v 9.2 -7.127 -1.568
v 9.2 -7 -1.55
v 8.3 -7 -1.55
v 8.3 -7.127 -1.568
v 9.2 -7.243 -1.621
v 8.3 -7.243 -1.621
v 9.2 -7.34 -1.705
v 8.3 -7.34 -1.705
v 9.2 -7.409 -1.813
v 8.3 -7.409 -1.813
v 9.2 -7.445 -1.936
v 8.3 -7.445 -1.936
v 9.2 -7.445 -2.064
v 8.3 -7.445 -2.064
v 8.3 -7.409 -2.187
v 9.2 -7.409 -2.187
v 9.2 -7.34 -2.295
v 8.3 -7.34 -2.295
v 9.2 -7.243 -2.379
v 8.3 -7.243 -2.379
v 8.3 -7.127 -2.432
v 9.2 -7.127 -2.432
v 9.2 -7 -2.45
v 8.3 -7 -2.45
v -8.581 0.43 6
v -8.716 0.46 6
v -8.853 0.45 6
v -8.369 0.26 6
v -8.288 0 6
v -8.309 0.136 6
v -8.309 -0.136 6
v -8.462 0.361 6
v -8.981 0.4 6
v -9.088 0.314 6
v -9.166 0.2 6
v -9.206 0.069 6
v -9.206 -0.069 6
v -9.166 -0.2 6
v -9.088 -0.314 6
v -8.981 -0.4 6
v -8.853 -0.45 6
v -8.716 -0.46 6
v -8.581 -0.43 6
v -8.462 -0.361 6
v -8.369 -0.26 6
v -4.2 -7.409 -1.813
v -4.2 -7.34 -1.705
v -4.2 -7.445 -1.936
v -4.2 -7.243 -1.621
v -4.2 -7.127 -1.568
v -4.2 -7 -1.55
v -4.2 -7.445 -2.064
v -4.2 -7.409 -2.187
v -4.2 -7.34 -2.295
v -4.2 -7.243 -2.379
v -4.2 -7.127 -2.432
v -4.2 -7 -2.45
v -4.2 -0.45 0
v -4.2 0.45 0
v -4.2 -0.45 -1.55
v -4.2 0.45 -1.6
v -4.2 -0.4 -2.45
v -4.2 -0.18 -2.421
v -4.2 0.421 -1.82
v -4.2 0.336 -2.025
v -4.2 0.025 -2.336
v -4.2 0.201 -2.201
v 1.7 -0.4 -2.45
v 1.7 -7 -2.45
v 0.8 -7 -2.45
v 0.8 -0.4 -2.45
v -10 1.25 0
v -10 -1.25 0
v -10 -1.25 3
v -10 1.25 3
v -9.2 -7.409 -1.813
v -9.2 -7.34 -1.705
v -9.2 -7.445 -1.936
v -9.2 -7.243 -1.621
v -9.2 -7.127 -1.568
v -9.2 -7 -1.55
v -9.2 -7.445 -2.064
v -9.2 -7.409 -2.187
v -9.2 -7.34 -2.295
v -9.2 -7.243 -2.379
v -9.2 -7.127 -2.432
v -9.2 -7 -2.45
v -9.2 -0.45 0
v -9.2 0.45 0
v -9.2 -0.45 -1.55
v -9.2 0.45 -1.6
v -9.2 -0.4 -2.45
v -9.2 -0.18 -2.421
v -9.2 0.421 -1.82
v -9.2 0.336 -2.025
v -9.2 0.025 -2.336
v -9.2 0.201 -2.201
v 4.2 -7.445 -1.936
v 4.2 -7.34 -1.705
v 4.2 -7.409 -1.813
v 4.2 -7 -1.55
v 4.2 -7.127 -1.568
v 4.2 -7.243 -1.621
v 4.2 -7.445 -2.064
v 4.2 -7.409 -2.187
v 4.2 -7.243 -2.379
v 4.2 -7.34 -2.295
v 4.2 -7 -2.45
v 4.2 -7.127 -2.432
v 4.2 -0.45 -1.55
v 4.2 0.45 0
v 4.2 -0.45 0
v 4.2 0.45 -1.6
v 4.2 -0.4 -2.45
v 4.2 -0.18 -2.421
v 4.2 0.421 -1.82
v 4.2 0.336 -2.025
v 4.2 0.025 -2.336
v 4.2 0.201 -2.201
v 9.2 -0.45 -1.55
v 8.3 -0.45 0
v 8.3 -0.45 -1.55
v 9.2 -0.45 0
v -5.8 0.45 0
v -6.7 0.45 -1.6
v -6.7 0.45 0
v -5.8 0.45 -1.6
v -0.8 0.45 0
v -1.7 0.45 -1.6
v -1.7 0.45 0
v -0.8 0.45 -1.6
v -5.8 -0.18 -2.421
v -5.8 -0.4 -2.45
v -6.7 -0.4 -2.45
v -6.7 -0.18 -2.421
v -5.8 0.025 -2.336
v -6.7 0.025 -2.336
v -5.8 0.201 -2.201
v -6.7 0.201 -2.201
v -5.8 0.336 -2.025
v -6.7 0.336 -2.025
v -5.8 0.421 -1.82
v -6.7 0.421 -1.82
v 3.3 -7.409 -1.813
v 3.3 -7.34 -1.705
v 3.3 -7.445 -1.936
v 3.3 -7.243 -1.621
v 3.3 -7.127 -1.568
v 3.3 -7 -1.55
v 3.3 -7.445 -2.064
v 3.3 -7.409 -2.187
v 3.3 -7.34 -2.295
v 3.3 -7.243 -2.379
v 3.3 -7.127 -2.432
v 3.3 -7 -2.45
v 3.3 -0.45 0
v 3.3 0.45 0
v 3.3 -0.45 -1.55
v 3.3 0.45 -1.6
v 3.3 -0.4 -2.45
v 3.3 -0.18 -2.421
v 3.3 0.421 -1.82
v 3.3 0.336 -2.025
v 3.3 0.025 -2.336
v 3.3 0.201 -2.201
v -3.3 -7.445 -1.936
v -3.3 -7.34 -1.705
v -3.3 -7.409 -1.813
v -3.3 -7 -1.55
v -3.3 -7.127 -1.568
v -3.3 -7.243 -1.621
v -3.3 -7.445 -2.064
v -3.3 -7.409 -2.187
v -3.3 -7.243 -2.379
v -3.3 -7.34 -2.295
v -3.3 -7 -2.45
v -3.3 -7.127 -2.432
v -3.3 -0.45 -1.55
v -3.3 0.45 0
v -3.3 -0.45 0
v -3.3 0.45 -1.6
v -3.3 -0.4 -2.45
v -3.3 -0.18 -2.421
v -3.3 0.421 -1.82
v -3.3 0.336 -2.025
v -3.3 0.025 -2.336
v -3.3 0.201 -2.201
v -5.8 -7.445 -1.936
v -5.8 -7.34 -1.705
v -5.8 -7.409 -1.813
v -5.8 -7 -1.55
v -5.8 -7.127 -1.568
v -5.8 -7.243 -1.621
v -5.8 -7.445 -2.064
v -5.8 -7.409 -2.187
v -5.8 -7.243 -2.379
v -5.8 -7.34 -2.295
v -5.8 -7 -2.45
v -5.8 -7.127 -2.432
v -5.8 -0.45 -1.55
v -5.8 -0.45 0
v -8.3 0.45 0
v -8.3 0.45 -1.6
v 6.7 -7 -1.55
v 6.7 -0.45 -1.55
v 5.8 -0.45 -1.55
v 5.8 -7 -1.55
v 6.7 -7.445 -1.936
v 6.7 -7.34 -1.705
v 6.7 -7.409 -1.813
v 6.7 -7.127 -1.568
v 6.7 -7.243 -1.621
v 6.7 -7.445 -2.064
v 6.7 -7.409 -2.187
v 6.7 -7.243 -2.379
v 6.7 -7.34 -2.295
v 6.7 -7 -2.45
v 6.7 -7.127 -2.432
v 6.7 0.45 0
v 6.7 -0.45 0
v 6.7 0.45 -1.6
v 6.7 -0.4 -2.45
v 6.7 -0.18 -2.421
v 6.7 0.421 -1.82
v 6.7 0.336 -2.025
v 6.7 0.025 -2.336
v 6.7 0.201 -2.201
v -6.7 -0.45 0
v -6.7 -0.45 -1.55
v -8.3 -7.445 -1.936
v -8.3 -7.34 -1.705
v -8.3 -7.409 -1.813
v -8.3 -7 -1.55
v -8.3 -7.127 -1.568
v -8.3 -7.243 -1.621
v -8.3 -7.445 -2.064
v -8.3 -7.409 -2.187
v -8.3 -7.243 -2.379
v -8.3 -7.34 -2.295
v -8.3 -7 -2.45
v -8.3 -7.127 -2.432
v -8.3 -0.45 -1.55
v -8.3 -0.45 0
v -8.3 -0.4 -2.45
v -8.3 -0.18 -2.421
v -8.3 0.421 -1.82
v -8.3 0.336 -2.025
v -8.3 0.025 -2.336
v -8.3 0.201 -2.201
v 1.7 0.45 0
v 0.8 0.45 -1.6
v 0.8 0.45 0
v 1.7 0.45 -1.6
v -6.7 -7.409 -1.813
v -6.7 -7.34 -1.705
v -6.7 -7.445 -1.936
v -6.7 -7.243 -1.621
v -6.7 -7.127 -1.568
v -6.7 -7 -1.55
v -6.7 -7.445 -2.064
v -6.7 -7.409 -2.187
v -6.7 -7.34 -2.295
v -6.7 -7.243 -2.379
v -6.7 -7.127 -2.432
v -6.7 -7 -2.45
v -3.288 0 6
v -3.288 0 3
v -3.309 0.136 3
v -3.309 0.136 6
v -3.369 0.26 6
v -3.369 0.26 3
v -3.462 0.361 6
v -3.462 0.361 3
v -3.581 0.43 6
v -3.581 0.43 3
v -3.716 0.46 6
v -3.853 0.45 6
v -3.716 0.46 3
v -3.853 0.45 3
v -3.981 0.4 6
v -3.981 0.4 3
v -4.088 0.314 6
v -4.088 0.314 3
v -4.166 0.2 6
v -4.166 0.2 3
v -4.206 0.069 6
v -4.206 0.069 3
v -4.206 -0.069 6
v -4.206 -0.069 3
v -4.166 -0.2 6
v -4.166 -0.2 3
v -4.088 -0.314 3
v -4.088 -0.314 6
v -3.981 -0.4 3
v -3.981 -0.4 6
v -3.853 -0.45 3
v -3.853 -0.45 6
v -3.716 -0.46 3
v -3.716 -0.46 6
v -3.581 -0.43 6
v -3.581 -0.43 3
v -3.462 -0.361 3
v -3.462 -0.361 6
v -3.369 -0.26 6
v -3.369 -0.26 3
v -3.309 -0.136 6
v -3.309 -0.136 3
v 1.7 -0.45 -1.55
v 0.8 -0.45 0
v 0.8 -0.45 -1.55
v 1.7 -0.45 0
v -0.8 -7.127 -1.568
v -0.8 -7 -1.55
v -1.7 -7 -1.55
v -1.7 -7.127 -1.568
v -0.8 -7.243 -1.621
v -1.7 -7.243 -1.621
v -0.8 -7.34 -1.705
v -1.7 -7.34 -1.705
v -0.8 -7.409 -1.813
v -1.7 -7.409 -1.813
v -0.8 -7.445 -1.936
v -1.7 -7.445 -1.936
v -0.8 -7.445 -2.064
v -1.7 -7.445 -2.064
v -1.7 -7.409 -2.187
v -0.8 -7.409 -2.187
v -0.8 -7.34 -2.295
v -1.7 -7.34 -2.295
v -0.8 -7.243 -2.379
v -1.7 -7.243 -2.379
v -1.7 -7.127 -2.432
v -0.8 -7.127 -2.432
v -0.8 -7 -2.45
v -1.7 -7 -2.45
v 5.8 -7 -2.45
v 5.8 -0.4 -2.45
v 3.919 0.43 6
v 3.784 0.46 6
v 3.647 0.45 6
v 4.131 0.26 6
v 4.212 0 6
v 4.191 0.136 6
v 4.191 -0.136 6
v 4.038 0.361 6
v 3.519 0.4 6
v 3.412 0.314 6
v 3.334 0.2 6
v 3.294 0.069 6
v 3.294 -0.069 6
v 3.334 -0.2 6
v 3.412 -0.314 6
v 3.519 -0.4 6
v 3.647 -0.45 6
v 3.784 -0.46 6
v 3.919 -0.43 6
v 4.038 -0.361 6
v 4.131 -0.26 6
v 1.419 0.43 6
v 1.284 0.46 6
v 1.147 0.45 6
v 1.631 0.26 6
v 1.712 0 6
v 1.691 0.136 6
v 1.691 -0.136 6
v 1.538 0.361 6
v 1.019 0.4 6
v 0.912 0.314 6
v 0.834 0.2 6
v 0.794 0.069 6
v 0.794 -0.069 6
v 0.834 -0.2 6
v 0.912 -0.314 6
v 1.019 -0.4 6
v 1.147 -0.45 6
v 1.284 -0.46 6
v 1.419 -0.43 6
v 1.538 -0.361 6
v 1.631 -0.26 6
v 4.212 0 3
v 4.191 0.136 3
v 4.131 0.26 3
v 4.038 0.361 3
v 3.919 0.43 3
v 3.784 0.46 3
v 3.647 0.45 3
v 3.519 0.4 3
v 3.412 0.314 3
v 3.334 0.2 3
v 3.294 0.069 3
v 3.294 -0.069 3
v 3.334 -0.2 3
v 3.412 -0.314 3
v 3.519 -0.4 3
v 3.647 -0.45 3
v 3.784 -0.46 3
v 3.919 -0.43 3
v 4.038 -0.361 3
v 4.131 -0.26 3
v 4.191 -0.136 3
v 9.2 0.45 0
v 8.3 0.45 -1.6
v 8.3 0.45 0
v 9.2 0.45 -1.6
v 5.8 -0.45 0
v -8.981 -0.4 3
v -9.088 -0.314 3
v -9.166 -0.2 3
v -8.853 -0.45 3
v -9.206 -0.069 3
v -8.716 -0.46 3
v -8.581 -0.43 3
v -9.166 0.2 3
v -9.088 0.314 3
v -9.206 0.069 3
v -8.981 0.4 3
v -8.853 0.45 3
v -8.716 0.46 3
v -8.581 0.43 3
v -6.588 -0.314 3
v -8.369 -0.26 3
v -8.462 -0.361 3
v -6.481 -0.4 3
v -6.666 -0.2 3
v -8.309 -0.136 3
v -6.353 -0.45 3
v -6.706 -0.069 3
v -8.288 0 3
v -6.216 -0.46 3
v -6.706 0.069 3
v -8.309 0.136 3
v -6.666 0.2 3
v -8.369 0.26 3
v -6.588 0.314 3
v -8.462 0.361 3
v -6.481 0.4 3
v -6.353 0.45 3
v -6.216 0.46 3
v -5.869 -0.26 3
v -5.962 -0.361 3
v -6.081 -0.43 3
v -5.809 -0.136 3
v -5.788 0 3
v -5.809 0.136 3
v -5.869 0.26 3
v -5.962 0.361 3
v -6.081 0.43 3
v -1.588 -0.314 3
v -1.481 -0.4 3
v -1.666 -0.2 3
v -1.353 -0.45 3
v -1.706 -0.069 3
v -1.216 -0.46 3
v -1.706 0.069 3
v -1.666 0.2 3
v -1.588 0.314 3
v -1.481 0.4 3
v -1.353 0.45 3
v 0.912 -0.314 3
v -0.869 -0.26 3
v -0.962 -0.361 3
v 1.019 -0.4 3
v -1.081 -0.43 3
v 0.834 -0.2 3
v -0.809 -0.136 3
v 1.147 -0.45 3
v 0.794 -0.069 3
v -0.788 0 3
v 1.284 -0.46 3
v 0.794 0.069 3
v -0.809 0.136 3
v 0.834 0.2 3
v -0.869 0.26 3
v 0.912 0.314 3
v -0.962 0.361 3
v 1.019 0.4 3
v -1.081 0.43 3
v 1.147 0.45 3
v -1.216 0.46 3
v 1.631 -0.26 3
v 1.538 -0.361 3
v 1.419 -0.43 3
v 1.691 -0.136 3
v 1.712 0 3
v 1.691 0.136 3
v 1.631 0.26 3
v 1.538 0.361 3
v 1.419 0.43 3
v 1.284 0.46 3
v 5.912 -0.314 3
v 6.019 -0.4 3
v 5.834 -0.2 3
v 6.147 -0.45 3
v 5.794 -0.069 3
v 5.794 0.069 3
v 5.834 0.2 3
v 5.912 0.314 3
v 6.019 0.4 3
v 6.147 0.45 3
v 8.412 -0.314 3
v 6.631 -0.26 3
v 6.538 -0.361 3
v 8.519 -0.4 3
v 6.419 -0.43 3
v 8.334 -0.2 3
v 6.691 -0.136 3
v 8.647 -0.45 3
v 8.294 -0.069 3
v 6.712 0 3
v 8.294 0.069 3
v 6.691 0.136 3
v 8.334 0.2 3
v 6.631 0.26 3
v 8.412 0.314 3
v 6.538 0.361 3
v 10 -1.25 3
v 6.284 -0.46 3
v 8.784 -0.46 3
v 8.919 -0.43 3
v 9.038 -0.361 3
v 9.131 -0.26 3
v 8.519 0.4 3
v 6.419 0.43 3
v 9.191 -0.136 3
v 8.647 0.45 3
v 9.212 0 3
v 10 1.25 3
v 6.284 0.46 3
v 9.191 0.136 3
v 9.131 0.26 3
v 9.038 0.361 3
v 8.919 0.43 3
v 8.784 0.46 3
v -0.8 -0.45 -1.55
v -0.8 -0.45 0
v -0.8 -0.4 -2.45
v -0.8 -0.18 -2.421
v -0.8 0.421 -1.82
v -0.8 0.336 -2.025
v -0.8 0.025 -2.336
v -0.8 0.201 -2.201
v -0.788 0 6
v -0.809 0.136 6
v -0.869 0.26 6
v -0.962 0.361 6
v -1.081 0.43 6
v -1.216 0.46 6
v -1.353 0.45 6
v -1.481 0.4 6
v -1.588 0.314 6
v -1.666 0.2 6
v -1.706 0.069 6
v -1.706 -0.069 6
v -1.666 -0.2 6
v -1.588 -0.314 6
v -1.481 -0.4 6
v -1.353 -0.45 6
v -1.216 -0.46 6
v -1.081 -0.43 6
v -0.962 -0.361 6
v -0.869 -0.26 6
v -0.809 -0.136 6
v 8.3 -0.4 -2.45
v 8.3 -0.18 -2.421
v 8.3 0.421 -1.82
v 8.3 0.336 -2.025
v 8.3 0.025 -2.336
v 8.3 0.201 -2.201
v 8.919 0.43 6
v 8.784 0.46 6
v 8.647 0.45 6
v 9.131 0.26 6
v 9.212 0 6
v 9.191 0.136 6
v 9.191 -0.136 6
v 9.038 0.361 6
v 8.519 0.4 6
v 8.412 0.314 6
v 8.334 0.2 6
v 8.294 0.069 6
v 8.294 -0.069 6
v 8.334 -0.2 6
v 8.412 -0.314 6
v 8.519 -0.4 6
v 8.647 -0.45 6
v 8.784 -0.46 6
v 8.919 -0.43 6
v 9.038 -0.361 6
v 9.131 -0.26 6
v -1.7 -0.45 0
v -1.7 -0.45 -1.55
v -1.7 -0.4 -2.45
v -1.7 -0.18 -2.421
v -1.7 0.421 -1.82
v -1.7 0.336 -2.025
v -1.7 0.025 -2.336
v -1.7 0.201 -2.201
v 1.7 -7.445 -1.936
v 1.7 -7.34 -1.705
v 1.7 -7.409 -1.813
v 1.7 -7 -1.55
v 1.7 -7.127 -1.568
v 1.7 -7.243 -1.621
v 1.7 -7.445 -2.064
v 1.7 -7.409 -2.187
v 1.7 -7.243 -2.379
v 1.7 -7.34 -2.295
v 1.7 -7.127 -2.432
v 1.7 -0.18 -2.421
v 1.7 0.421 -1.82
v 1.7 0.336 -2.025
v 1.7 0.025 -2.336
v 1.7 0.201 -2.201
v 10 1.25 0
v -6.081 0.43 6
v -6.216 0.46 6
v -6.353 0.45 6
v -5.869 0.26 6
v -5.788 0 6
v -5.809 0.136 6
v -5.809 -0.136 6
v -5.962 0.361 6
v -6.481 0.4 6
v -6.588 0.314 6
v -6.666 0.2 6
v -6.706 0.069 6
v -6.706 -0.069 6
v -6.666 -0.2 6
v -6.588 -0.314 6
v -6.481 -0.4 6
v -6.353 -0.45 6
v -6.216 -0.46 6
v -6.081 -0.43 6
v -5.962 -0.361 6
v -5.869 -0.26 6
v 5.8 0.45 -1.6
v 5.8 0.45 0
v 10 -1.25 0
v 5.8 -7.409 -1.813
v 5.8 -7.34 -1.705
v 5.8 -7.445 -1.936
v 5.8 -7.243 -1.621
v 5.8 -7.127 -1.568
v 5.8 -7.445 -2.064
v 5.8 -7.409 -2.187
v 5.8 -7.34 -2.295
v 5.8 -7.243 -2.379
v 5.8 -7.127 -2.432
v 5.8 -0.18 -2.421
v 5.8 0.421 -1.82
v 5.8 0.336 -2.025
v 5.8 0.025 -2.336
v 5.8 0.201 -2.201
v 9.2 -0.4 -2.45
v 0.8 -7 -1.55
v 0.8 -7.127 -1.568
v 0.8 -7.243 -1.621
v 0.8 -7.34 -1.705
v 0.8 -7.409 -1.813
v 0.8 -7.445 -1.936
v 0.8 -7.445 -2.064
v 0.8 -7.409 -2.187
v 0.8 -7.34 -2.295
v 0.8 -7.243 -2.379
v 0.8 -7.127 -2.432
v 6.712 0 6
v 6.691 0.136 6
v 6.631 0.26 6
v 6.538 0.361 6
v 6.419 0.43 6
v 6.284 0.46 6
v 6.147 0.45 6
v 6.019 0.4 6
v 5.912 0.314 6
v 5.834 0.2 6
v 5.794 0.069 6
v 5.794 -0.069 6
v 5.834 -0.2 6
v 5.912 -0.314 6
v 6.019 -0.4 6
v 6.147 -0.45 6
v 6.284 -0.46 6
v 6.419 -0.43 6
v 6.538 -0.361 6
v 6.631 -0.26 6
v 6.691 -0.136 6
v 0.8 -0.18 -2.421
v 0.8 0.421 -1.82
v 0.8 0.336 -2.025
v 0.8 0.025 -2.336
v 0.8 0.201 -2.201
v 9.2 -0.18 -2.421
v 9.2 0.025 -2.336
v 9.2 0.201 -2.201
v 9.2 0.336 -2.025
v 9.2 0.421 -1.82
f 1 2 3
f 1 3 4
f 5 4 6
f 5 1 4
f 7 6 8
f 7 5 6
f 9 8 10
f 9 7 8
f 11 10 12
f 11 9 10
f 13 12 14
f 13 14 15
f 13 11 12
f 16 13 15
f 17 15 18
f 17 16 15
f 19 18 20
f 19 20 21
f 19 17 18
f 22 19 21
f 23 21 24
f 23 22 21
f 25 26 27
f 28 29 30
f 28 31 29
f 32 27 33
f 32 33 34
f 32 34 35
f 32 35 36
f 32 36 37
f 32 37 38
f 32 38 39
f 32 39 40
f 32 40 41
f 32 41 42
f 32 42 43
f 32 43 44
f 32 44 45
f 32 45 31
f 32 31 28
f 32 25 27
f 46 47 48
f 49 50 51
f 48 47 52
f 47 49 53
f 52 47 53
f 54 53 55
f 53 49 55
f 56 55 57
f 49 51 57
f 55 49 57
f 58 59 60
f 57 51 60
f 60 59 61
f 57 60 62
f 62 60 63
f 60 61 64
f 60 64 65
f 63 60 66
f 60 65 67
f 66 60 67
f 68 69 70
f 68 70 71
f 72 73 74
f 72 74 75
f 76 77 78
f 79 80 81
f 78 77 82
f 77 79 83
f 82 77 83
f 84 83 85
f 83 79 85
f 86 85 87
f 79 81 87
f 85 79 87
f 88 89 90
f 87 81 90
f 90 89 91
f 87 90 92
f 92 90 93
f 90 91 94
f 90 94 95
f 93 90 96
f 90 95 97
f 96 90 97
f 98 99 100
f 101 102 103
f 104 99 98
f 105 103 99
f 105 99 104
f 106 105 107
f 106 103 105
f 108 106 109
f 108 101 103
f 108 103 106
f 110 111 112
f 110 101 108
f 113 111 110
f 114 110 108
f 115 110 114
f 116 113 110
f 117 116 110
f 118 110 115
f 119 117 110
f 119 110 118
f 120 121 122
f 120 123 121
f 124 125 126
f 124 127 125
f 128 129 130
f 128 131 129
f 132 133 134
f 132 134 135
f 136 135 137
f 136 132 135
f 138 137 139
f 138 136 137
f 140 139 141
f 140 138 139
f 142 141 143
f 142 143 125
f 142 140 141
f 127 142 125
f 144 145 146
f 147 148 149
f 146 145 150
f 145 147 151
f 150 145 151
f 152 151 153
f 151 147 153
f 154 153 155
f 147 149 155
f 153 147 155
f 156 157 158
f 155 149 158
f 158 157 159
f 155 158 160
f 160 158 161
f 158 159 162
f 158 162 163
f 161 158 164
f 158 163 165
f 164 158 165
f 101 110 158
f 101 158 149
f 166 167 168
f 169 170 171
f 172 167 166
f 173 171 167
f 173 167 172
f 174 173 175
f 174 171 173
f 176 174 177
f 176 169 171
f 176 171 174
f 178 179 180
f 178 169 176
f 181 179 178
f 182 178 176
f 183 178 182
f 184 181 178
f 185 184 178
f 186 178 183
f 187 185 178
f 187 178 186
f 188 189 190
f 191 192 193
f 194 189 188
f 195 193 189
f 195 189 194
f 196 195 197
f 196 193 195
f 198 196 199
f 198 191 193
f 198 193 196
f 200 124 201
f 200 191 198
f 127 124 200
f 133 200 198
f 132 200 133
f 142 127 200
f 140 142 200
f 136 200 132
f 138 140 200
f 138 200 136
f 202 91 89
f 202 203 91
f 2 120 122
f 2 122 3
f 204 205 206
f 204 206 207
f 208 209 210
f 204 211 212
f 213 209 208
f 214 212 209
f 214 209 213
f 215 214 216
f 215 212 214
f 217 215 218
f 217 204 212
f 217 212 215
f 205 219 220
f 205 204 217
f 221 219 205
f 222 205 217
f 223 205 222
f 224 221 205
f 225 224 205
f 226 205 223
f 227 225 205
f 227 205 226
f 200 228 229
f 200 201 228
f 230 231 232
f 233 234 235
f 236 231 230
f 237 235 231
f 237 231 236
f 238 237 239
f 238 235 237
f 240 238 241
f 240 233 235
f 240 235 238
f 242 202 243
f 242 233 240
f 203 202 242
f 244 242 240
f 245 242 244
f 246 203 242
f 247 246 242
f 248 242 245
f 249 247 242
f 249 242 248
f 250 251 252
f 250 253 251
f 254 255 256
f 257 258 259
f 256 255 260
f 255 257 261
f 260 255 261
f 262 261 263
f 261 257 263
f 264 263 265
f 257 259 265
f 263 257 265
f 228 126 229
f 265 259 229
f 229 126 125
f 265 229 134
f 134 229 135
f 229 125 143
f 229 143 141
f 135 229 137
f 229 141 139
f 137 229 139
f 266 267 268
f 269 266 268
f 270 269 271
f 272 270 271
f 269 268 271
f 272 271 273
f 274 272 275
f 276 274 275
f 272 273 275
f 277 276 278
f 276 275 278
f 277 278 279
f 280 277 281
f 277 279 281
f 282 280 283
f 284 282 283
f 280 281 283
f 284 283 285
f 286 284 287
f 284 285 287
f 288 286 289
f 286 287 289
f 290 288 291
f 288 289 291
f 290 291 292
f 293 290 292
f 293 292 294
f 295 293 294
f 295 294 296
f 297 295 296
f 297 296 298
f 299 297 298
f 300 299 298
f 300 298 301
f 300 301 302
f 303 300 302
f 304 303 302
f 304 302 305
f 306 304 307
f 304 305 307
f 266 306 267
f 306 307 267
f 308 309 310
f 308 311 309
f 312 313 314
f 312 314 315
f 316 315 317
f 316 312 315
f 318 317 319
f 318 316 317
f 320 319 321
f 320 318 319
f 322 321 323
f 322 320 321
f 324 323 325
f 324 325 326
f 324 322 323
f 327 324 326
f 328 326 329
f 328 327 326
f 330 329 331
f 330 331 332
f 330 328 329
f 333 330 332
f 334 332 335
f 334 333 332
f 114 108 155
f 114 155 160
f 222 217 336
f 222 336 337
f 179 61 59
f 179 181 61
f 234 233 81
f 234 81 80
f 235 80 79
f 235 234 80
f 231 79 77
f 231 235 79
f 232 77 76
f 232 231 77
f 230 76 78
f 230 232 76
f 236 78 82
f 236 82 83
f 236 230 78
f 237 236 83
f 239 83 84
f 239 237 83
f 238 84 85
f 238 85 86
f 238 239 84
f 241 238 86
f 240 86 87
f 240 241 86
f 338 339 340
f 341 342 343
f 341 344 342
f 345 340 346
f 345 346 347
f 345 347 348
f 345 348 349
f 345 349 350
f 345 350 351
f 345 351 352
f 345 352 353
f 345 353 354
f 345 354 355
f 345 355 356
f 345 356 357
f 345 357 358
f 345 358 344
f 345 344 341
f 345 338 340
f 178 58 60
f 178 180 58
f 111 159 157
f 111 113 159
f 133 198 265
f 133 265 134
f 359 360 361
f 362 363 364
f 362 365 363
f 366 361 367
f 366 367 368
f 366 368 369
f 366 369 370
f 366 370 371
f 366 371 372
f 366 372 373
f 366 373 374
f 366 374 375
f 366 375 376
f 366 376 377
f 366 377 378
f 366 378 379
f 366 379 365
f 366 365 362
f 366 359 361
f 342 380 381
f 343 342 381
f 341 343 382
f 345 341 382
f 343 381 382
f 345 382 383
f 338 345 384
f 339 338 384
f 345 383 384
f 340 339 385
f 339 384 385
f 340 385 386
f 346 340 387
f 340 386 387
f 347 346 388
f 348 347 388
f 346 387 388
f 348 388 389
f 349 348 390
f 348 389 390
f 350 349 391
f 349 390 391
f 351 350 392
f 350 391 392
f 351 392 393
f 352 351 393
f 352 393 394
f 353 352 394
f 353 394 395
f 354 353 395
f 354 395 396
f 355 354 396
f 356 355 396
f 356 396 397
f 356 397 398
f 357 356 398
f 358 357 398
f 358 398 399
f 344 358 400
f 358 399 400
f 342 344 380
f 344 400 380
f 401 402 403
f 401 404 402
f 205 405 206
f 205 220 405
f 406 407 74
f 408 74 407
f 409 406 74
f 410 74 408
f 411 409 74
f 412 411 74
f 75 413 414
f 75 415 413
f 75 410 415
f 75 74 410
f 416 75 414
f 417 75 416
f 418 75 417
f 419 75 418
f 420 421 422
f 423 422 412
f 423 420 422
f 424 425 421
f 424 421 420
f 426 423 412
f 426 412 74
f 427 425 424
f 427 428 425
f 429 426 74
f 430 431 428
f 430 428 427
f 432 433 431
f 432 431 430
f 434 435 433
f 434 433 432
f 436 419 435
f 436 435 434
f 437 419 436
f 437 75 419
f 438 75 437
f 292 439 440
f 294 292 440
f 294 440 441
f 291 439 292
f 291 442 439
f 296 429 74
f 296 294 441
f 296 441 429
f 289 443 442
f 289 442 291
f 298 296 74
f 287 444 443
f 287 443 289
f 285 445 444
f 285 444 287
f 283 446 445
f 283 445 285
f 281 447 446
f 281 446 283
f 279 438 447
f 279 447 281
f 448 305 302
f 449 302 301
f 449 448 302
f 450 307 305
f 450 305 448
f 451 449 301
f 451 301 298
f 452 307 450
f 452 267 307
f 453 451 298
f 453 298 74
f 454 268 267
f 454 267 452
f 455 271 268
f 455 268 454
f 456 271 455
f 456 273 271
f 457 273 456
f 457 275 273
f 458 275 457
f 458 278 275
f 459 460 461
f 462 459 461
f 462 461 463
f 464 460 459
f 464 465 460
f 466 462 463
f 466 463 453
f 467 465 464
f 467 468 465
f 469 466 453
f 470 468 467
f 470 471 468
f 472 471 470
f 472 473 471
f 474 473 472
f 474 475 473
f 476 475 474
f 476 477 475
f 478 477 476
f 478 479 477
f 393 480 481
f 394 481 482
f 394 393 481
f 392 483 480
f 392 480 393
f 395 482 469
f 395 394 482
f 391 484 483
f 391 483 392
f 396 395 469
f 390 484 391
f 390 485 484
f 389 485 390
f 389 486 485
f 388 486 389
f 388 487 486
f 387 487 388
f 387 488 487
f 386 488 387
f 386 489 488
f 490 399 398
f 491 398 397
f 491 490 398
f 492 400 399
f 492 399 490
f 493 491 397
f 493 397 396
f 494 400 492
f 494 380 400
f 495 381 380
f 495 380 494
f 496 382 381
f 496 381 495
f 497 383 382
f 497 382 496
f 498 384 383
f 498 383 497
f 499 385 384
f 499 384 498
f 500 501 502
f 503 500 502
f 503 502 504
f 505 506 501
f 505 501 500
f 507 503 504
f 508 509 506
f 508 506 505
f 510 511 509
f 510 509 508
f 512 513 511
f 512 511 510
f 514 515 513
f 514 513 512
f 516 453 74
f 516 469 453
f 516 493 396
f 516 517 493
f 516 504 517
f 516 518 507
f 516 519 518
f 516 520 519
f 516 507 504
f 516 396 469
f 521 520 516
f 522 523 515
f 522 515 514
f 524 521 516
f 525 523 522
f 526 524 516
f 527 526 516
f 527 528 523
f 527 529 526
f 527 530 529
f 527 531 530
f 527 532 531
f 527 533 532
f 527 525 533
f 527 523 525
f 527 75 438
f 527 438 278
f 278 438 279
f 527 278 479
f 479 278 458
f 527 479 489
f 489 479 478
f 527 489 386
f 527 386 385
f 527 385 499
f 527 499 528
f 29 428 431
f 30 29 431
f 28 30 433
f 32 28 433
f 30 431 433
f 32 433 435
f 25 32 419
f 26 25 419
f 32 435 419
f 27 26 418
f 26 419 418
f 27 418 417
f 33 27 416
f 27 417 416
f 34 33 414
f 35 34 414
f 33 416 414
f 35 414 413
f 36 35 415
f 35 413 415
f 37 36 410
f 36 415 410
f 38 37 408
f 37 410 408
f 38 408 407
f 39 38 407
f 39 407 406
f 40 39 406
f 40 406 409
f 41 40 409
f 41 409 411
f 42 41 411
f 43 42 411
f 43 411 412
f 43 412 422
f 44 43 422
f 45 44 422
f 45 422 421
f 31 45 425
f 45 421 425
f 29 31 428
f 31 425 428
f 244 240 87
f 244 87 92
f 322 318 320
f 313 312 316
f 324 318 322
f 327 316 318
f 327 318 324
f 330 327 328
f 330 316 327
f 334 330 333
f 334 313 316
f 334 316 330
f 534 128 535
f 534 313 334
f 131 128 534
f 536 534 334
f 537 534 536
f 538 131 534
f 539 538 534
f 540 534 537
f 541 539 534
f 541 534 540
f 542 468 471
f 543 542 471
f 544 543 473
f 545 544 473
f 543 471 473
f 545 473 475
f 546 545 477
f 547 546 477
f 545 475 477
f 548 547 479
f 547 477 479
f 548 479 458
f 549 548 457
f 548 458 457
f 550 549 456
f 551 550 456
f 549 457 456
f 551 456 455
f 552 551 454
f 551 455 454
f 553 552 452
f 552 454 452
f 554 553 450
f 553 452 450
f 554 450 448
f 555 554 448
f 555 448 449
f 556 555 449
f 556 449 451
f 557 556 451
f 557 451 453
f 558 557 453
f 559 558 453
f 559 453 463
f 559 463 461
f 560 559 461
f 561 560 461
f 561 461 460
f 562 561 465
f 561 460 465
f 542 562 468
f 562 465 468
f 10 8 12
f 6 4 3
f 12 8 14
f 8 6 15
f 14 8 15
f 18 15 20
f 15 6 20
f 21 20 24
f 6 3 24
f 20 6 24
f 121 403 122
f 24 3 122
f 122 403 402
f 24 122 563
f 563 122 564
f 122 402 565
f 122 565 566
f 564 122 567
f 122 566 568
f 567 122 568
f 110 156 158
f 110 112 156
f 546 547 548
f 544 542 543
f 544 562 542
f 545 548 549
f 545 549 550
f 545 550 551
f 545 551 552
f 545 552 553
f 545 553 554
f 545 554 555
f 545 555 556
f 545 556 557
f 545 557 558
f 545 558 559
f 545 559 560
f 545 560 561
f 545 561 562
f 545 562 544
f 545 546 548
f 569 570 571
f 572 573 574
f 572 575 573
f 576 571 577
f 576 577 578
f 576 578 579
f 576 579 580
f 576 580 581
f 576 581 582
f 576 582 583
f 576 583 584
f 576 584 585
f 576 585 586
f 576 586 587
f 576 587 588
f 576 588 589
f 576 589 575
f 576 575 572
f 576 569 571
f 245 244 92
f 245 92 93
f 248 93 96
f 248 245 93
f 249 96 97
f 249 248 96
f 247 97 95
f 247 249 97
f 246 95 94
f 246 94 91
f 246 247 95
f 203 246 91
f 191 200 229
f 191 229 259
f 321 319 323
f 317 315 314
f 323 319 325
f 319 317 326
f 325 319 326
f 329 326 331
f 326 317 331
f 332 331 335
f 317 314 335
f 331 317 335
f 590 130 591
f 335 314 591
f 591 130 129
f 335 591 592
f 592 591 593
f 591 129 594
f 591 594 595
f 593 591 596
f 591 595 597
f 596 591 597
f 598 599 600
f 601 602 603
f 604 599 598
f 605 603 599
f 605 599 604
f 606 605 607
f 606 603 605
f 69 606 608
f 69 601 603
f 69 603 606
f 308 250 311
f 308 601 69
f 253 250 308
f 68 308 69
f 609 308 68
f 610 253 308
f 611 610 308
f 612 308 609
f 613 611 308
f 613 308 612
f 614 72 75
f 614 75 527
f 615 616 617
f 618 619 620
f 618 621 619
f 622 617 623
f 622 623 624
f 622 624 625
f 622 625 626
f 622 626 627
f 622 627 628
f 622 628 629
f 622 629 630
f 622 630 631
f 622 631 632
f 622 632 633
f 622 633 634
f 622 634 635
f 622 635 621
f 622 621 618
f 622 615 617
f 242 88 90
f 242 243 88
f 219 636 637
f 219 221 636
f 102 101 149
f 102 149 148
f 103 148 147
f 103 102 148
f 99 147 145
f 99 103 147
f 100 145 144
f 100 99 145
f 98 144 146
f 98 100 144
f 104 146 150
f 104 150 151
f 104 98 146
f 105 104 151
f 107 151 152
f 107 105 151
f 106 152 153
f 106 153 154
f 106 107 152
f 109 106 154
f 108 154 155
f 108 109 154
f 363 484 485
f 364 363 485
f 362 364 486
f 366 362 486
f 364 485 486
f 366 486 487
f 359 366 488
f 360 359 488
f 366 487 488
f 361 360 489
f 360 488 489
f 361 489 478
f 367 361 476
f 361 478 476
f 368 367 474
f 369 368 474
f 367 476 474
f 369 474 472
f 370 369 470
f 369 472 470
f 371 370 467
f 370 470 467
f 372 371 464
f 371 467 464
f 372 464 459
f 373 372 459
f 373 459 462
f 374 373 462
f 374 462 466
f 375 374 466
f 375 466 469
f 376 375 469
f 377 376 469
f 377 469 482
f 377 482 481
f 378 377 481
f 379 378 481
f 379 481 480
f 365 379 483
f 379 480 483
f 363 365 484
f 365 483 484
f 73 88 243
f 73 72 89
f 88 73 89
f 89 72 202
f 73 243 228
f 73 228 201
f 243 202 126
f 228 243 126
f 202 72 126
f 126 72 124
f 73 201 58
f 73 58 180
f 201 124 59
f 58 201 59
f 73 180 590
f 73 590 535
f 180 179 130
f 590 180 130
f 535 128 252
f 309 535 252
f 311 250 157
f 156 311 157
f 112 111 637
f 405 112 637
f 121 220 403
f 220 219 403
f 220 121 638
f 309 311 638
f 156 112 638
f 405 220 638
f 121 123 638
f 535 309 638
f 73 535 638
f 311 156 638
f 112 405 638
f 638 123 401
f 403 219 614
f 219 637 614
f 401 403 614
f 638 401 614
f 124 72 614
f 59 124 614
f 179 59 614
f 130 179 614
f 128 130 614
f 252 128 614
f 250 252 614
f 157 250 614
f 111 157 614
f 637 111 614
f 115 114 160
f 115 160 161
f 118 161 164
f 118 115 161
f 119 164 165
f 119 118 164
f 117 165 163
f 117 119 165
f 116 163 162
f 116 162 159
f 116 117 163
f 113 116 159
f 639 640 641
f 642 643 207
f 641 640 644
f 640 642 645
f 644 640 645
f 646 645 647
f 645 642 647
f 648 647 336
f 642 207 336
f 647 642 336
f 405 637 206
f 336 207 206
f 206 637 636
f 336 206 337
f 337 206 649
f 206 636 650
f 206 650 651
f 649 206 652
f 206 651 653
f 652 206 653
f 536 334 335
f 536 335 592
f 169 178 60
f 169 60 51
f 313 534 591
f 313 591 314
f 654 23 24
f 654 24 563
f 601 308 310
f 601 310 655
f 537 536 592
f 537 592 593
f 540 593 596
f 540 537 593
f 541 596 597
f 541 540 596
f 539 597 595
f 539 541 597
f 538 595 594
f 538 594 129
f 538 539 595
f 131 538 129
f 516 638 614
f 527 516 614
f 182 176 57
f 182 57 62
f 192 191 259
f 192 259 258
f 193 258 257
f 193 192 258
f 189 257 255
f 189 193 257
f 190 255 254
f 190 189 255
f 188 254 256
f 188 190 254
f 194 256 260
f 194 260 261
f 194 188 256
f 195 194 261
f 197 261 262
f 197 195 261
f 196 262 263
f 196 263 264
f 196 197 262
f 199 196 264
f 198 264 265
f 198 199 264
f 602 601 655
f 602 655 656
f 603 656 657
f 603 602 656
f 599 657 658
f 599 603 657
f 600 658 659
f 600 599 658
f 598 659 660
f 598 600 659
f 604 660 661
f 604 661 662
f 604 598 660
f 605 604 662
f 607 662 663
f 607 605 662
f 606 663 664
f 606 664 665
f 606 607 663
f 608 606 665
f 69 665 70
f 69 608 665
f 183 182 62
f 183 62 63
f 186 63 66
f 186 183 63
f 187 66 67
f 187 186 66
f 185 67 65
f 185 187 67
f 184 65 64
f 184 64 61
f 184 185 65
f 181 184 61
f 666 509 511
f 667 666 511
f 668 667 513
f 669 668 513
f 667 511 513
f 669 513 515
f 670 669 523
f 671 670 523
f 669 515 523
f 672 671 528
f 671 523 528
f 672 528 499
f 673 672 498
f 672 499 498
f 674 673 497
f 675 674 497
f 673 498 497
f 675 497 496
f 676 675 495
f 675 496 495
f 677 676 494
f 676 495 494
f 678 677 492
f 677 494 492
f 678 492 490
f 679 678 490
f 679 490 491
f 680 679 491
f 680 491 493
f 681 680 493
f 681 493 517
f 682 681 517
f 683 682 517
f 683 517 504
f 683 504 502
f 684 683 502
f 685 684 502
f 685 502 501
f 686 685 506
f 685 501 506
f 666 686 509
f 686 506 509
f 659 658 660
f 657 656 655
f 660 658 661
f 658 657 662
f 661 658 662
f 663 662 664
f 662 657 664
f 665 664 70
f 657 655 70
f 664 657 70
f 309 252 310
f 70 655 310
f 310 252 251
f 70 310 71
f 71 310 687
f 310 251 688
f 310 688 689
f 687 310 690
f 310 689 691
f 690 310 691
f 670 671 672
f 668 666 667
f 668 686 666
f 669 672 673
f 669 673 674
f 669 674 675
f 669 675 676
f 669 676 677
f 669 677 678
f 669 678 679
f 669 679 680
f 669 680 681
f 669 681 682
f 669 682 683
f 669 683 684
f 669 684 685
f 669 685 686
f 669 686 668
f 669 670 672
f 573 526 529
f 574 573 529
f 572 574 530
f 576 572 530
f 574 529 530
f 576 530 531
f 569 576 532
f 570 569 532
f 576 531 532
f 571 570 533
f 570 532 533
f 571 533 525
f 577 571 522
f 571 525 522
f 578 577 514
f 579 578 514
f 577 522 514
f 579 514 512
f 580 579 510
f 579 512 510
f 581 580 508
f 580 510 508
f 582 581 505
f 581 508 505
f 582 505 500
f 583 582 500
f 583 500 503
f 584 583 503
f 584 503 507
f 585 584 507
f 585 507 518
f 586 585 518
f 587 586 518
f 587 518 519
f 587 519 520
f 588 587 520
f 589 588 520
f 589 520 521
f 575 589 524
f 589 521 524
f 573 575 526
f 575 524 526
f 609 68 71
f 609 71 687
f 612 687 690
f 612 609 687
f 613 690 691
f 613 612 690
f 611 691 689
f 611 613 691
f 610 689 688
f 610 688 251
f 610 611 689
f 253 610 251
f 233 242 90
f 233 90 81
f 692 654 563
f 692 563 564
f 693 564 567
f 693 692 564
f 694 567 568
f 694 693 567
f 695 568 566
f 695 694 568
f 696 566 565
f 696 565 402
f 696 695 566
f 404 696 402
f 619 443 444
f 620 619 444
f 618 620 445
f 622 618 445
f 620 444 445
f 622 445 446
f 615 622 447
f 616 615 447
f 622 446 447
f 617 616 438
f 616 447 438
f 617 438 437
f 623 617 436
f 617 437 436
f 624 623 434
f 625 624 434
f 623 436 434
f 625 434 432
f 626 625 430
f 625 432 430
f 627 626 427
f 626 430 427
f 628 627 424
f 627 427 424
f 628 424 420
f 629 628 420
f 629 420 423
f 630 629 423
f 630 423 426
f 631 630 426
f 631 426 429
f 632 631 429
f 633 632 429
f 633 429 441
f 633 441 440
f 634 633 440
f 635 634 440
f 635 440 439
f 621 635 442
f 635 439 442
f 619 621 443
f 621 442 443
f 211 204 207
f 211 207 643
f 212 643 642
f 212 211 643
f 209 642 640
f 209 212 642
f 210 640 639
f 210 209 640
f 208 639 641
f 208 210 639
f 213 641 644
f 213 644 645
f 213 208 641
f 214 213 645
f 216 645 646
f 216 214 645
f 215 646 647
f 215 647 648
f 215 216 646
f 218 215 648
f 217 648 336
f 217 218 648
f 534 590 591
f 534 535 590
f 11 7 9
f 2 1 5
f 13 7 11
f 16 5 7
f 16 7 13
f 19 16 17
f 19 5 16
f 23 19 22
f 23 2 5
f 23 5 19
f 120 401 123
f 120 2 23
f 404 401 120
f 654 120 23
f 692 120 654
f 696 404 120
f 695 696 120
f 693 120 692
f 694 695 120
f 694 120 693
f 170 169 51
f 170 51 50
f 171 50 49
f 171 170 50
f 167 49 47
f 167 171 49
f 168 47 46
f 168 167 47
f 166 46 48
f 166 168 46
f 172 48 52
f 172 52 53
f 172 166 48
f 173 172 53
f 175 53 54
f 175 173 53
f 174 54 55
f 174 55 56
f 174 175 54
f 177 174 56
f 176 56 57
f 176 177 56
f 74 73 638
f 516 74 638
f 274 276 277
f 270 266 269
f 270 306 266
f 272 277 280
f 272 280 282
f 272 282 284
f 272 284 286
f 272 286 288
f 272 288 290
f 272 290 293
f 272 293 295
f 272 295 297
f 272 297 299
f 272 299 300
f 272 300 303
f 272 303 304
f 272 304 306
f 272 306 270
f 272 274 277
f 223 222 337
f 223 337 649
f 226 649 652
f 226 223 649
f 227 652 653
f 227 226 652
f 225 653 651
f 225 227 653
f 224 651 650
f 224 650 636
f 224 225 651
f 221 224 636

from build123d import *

# Parameters (mm, degrees)
CROQUIS1_W              = 20
CROQUIS1_H              = 2.5
SALIENTE_EXTRUIR1_DEPTH = 3
CROQUIS2_R              = 0.461571169
SALIENTE_EXTRUIR2_DEPTH = 3
MATRIZL1_COUNT          = 8
MATRIZL1_PITCH          = 2.5
SALIENTE_EXTRUIR3_DEPTH = 0.45
MATRIZL2_COUNT          = 8
MATRIZL2_PITCH          = 2.5


with BuildPart() as part:
    # Croquis1 → Saliente-Extruir1 (new body)
    with BuildSketch(Plane.XY):
        Rectangle(CROQUIS1_W, CROQUIS1_H)
    extrude(amount=SALIENTE_EXTRUIR1_DEPTH)

    # Croquis2 → Saliente-Extruir2 (add)
    with BuildSketch(Plane.XY.offset(3)):
        with Locations((-8.75, 0)):
            Circle(CROQUIS2_R)
    saliente_extruir2 = extrude(amount=SALIENTE_EXTRUIR2_DEPTH)

    # MatrizL1: Saliente-Extruir2 ×8
    with Locations(*[(i * MATRIZL1_PITCH, 0, 0) for i in range(1, MATRIZL1_COUNT)]):
        add(saliente_extruir2)

    # Croquis3 → Saliente-Extruir3 (add, symmetric)
    with BuildSketch(Plane(origin=(8.75, 0, 0), x_dir=(0, 0, -1), z_dir=(1, 0, 0))):
        with BuildLine():
            Line((0, -0.45), (1.55, -0.45))
            Line((1.55, -0.45), (1.55, -7))
            ThreePointArc((1.55, -7), (2, -7.45), (2.45, -7))
            Line((2.45, -7), (2.45, -0.4))
            ThreePointArc((2.45, -0.4), (2.201040764, 0.201040764), (1.6, 0.45))
            Line((1.6, 0.45), (0, 0.45))
            Line((0, 0.45), (0, -0.45))
        make_face()
    saliente_extruir3 = extrude(amount=SALIENTE_EXTRUIR3_DEPTH, both=True)

    # MatrizL2: Saliente-Extruir3 ×8
    with Locations(*[(-i * MATRIZL2_PITCH, 0, 0) for i in range(1, MATRIZL2_COUNT)]):
        add(saliente_extruir3)


solid = part.part
